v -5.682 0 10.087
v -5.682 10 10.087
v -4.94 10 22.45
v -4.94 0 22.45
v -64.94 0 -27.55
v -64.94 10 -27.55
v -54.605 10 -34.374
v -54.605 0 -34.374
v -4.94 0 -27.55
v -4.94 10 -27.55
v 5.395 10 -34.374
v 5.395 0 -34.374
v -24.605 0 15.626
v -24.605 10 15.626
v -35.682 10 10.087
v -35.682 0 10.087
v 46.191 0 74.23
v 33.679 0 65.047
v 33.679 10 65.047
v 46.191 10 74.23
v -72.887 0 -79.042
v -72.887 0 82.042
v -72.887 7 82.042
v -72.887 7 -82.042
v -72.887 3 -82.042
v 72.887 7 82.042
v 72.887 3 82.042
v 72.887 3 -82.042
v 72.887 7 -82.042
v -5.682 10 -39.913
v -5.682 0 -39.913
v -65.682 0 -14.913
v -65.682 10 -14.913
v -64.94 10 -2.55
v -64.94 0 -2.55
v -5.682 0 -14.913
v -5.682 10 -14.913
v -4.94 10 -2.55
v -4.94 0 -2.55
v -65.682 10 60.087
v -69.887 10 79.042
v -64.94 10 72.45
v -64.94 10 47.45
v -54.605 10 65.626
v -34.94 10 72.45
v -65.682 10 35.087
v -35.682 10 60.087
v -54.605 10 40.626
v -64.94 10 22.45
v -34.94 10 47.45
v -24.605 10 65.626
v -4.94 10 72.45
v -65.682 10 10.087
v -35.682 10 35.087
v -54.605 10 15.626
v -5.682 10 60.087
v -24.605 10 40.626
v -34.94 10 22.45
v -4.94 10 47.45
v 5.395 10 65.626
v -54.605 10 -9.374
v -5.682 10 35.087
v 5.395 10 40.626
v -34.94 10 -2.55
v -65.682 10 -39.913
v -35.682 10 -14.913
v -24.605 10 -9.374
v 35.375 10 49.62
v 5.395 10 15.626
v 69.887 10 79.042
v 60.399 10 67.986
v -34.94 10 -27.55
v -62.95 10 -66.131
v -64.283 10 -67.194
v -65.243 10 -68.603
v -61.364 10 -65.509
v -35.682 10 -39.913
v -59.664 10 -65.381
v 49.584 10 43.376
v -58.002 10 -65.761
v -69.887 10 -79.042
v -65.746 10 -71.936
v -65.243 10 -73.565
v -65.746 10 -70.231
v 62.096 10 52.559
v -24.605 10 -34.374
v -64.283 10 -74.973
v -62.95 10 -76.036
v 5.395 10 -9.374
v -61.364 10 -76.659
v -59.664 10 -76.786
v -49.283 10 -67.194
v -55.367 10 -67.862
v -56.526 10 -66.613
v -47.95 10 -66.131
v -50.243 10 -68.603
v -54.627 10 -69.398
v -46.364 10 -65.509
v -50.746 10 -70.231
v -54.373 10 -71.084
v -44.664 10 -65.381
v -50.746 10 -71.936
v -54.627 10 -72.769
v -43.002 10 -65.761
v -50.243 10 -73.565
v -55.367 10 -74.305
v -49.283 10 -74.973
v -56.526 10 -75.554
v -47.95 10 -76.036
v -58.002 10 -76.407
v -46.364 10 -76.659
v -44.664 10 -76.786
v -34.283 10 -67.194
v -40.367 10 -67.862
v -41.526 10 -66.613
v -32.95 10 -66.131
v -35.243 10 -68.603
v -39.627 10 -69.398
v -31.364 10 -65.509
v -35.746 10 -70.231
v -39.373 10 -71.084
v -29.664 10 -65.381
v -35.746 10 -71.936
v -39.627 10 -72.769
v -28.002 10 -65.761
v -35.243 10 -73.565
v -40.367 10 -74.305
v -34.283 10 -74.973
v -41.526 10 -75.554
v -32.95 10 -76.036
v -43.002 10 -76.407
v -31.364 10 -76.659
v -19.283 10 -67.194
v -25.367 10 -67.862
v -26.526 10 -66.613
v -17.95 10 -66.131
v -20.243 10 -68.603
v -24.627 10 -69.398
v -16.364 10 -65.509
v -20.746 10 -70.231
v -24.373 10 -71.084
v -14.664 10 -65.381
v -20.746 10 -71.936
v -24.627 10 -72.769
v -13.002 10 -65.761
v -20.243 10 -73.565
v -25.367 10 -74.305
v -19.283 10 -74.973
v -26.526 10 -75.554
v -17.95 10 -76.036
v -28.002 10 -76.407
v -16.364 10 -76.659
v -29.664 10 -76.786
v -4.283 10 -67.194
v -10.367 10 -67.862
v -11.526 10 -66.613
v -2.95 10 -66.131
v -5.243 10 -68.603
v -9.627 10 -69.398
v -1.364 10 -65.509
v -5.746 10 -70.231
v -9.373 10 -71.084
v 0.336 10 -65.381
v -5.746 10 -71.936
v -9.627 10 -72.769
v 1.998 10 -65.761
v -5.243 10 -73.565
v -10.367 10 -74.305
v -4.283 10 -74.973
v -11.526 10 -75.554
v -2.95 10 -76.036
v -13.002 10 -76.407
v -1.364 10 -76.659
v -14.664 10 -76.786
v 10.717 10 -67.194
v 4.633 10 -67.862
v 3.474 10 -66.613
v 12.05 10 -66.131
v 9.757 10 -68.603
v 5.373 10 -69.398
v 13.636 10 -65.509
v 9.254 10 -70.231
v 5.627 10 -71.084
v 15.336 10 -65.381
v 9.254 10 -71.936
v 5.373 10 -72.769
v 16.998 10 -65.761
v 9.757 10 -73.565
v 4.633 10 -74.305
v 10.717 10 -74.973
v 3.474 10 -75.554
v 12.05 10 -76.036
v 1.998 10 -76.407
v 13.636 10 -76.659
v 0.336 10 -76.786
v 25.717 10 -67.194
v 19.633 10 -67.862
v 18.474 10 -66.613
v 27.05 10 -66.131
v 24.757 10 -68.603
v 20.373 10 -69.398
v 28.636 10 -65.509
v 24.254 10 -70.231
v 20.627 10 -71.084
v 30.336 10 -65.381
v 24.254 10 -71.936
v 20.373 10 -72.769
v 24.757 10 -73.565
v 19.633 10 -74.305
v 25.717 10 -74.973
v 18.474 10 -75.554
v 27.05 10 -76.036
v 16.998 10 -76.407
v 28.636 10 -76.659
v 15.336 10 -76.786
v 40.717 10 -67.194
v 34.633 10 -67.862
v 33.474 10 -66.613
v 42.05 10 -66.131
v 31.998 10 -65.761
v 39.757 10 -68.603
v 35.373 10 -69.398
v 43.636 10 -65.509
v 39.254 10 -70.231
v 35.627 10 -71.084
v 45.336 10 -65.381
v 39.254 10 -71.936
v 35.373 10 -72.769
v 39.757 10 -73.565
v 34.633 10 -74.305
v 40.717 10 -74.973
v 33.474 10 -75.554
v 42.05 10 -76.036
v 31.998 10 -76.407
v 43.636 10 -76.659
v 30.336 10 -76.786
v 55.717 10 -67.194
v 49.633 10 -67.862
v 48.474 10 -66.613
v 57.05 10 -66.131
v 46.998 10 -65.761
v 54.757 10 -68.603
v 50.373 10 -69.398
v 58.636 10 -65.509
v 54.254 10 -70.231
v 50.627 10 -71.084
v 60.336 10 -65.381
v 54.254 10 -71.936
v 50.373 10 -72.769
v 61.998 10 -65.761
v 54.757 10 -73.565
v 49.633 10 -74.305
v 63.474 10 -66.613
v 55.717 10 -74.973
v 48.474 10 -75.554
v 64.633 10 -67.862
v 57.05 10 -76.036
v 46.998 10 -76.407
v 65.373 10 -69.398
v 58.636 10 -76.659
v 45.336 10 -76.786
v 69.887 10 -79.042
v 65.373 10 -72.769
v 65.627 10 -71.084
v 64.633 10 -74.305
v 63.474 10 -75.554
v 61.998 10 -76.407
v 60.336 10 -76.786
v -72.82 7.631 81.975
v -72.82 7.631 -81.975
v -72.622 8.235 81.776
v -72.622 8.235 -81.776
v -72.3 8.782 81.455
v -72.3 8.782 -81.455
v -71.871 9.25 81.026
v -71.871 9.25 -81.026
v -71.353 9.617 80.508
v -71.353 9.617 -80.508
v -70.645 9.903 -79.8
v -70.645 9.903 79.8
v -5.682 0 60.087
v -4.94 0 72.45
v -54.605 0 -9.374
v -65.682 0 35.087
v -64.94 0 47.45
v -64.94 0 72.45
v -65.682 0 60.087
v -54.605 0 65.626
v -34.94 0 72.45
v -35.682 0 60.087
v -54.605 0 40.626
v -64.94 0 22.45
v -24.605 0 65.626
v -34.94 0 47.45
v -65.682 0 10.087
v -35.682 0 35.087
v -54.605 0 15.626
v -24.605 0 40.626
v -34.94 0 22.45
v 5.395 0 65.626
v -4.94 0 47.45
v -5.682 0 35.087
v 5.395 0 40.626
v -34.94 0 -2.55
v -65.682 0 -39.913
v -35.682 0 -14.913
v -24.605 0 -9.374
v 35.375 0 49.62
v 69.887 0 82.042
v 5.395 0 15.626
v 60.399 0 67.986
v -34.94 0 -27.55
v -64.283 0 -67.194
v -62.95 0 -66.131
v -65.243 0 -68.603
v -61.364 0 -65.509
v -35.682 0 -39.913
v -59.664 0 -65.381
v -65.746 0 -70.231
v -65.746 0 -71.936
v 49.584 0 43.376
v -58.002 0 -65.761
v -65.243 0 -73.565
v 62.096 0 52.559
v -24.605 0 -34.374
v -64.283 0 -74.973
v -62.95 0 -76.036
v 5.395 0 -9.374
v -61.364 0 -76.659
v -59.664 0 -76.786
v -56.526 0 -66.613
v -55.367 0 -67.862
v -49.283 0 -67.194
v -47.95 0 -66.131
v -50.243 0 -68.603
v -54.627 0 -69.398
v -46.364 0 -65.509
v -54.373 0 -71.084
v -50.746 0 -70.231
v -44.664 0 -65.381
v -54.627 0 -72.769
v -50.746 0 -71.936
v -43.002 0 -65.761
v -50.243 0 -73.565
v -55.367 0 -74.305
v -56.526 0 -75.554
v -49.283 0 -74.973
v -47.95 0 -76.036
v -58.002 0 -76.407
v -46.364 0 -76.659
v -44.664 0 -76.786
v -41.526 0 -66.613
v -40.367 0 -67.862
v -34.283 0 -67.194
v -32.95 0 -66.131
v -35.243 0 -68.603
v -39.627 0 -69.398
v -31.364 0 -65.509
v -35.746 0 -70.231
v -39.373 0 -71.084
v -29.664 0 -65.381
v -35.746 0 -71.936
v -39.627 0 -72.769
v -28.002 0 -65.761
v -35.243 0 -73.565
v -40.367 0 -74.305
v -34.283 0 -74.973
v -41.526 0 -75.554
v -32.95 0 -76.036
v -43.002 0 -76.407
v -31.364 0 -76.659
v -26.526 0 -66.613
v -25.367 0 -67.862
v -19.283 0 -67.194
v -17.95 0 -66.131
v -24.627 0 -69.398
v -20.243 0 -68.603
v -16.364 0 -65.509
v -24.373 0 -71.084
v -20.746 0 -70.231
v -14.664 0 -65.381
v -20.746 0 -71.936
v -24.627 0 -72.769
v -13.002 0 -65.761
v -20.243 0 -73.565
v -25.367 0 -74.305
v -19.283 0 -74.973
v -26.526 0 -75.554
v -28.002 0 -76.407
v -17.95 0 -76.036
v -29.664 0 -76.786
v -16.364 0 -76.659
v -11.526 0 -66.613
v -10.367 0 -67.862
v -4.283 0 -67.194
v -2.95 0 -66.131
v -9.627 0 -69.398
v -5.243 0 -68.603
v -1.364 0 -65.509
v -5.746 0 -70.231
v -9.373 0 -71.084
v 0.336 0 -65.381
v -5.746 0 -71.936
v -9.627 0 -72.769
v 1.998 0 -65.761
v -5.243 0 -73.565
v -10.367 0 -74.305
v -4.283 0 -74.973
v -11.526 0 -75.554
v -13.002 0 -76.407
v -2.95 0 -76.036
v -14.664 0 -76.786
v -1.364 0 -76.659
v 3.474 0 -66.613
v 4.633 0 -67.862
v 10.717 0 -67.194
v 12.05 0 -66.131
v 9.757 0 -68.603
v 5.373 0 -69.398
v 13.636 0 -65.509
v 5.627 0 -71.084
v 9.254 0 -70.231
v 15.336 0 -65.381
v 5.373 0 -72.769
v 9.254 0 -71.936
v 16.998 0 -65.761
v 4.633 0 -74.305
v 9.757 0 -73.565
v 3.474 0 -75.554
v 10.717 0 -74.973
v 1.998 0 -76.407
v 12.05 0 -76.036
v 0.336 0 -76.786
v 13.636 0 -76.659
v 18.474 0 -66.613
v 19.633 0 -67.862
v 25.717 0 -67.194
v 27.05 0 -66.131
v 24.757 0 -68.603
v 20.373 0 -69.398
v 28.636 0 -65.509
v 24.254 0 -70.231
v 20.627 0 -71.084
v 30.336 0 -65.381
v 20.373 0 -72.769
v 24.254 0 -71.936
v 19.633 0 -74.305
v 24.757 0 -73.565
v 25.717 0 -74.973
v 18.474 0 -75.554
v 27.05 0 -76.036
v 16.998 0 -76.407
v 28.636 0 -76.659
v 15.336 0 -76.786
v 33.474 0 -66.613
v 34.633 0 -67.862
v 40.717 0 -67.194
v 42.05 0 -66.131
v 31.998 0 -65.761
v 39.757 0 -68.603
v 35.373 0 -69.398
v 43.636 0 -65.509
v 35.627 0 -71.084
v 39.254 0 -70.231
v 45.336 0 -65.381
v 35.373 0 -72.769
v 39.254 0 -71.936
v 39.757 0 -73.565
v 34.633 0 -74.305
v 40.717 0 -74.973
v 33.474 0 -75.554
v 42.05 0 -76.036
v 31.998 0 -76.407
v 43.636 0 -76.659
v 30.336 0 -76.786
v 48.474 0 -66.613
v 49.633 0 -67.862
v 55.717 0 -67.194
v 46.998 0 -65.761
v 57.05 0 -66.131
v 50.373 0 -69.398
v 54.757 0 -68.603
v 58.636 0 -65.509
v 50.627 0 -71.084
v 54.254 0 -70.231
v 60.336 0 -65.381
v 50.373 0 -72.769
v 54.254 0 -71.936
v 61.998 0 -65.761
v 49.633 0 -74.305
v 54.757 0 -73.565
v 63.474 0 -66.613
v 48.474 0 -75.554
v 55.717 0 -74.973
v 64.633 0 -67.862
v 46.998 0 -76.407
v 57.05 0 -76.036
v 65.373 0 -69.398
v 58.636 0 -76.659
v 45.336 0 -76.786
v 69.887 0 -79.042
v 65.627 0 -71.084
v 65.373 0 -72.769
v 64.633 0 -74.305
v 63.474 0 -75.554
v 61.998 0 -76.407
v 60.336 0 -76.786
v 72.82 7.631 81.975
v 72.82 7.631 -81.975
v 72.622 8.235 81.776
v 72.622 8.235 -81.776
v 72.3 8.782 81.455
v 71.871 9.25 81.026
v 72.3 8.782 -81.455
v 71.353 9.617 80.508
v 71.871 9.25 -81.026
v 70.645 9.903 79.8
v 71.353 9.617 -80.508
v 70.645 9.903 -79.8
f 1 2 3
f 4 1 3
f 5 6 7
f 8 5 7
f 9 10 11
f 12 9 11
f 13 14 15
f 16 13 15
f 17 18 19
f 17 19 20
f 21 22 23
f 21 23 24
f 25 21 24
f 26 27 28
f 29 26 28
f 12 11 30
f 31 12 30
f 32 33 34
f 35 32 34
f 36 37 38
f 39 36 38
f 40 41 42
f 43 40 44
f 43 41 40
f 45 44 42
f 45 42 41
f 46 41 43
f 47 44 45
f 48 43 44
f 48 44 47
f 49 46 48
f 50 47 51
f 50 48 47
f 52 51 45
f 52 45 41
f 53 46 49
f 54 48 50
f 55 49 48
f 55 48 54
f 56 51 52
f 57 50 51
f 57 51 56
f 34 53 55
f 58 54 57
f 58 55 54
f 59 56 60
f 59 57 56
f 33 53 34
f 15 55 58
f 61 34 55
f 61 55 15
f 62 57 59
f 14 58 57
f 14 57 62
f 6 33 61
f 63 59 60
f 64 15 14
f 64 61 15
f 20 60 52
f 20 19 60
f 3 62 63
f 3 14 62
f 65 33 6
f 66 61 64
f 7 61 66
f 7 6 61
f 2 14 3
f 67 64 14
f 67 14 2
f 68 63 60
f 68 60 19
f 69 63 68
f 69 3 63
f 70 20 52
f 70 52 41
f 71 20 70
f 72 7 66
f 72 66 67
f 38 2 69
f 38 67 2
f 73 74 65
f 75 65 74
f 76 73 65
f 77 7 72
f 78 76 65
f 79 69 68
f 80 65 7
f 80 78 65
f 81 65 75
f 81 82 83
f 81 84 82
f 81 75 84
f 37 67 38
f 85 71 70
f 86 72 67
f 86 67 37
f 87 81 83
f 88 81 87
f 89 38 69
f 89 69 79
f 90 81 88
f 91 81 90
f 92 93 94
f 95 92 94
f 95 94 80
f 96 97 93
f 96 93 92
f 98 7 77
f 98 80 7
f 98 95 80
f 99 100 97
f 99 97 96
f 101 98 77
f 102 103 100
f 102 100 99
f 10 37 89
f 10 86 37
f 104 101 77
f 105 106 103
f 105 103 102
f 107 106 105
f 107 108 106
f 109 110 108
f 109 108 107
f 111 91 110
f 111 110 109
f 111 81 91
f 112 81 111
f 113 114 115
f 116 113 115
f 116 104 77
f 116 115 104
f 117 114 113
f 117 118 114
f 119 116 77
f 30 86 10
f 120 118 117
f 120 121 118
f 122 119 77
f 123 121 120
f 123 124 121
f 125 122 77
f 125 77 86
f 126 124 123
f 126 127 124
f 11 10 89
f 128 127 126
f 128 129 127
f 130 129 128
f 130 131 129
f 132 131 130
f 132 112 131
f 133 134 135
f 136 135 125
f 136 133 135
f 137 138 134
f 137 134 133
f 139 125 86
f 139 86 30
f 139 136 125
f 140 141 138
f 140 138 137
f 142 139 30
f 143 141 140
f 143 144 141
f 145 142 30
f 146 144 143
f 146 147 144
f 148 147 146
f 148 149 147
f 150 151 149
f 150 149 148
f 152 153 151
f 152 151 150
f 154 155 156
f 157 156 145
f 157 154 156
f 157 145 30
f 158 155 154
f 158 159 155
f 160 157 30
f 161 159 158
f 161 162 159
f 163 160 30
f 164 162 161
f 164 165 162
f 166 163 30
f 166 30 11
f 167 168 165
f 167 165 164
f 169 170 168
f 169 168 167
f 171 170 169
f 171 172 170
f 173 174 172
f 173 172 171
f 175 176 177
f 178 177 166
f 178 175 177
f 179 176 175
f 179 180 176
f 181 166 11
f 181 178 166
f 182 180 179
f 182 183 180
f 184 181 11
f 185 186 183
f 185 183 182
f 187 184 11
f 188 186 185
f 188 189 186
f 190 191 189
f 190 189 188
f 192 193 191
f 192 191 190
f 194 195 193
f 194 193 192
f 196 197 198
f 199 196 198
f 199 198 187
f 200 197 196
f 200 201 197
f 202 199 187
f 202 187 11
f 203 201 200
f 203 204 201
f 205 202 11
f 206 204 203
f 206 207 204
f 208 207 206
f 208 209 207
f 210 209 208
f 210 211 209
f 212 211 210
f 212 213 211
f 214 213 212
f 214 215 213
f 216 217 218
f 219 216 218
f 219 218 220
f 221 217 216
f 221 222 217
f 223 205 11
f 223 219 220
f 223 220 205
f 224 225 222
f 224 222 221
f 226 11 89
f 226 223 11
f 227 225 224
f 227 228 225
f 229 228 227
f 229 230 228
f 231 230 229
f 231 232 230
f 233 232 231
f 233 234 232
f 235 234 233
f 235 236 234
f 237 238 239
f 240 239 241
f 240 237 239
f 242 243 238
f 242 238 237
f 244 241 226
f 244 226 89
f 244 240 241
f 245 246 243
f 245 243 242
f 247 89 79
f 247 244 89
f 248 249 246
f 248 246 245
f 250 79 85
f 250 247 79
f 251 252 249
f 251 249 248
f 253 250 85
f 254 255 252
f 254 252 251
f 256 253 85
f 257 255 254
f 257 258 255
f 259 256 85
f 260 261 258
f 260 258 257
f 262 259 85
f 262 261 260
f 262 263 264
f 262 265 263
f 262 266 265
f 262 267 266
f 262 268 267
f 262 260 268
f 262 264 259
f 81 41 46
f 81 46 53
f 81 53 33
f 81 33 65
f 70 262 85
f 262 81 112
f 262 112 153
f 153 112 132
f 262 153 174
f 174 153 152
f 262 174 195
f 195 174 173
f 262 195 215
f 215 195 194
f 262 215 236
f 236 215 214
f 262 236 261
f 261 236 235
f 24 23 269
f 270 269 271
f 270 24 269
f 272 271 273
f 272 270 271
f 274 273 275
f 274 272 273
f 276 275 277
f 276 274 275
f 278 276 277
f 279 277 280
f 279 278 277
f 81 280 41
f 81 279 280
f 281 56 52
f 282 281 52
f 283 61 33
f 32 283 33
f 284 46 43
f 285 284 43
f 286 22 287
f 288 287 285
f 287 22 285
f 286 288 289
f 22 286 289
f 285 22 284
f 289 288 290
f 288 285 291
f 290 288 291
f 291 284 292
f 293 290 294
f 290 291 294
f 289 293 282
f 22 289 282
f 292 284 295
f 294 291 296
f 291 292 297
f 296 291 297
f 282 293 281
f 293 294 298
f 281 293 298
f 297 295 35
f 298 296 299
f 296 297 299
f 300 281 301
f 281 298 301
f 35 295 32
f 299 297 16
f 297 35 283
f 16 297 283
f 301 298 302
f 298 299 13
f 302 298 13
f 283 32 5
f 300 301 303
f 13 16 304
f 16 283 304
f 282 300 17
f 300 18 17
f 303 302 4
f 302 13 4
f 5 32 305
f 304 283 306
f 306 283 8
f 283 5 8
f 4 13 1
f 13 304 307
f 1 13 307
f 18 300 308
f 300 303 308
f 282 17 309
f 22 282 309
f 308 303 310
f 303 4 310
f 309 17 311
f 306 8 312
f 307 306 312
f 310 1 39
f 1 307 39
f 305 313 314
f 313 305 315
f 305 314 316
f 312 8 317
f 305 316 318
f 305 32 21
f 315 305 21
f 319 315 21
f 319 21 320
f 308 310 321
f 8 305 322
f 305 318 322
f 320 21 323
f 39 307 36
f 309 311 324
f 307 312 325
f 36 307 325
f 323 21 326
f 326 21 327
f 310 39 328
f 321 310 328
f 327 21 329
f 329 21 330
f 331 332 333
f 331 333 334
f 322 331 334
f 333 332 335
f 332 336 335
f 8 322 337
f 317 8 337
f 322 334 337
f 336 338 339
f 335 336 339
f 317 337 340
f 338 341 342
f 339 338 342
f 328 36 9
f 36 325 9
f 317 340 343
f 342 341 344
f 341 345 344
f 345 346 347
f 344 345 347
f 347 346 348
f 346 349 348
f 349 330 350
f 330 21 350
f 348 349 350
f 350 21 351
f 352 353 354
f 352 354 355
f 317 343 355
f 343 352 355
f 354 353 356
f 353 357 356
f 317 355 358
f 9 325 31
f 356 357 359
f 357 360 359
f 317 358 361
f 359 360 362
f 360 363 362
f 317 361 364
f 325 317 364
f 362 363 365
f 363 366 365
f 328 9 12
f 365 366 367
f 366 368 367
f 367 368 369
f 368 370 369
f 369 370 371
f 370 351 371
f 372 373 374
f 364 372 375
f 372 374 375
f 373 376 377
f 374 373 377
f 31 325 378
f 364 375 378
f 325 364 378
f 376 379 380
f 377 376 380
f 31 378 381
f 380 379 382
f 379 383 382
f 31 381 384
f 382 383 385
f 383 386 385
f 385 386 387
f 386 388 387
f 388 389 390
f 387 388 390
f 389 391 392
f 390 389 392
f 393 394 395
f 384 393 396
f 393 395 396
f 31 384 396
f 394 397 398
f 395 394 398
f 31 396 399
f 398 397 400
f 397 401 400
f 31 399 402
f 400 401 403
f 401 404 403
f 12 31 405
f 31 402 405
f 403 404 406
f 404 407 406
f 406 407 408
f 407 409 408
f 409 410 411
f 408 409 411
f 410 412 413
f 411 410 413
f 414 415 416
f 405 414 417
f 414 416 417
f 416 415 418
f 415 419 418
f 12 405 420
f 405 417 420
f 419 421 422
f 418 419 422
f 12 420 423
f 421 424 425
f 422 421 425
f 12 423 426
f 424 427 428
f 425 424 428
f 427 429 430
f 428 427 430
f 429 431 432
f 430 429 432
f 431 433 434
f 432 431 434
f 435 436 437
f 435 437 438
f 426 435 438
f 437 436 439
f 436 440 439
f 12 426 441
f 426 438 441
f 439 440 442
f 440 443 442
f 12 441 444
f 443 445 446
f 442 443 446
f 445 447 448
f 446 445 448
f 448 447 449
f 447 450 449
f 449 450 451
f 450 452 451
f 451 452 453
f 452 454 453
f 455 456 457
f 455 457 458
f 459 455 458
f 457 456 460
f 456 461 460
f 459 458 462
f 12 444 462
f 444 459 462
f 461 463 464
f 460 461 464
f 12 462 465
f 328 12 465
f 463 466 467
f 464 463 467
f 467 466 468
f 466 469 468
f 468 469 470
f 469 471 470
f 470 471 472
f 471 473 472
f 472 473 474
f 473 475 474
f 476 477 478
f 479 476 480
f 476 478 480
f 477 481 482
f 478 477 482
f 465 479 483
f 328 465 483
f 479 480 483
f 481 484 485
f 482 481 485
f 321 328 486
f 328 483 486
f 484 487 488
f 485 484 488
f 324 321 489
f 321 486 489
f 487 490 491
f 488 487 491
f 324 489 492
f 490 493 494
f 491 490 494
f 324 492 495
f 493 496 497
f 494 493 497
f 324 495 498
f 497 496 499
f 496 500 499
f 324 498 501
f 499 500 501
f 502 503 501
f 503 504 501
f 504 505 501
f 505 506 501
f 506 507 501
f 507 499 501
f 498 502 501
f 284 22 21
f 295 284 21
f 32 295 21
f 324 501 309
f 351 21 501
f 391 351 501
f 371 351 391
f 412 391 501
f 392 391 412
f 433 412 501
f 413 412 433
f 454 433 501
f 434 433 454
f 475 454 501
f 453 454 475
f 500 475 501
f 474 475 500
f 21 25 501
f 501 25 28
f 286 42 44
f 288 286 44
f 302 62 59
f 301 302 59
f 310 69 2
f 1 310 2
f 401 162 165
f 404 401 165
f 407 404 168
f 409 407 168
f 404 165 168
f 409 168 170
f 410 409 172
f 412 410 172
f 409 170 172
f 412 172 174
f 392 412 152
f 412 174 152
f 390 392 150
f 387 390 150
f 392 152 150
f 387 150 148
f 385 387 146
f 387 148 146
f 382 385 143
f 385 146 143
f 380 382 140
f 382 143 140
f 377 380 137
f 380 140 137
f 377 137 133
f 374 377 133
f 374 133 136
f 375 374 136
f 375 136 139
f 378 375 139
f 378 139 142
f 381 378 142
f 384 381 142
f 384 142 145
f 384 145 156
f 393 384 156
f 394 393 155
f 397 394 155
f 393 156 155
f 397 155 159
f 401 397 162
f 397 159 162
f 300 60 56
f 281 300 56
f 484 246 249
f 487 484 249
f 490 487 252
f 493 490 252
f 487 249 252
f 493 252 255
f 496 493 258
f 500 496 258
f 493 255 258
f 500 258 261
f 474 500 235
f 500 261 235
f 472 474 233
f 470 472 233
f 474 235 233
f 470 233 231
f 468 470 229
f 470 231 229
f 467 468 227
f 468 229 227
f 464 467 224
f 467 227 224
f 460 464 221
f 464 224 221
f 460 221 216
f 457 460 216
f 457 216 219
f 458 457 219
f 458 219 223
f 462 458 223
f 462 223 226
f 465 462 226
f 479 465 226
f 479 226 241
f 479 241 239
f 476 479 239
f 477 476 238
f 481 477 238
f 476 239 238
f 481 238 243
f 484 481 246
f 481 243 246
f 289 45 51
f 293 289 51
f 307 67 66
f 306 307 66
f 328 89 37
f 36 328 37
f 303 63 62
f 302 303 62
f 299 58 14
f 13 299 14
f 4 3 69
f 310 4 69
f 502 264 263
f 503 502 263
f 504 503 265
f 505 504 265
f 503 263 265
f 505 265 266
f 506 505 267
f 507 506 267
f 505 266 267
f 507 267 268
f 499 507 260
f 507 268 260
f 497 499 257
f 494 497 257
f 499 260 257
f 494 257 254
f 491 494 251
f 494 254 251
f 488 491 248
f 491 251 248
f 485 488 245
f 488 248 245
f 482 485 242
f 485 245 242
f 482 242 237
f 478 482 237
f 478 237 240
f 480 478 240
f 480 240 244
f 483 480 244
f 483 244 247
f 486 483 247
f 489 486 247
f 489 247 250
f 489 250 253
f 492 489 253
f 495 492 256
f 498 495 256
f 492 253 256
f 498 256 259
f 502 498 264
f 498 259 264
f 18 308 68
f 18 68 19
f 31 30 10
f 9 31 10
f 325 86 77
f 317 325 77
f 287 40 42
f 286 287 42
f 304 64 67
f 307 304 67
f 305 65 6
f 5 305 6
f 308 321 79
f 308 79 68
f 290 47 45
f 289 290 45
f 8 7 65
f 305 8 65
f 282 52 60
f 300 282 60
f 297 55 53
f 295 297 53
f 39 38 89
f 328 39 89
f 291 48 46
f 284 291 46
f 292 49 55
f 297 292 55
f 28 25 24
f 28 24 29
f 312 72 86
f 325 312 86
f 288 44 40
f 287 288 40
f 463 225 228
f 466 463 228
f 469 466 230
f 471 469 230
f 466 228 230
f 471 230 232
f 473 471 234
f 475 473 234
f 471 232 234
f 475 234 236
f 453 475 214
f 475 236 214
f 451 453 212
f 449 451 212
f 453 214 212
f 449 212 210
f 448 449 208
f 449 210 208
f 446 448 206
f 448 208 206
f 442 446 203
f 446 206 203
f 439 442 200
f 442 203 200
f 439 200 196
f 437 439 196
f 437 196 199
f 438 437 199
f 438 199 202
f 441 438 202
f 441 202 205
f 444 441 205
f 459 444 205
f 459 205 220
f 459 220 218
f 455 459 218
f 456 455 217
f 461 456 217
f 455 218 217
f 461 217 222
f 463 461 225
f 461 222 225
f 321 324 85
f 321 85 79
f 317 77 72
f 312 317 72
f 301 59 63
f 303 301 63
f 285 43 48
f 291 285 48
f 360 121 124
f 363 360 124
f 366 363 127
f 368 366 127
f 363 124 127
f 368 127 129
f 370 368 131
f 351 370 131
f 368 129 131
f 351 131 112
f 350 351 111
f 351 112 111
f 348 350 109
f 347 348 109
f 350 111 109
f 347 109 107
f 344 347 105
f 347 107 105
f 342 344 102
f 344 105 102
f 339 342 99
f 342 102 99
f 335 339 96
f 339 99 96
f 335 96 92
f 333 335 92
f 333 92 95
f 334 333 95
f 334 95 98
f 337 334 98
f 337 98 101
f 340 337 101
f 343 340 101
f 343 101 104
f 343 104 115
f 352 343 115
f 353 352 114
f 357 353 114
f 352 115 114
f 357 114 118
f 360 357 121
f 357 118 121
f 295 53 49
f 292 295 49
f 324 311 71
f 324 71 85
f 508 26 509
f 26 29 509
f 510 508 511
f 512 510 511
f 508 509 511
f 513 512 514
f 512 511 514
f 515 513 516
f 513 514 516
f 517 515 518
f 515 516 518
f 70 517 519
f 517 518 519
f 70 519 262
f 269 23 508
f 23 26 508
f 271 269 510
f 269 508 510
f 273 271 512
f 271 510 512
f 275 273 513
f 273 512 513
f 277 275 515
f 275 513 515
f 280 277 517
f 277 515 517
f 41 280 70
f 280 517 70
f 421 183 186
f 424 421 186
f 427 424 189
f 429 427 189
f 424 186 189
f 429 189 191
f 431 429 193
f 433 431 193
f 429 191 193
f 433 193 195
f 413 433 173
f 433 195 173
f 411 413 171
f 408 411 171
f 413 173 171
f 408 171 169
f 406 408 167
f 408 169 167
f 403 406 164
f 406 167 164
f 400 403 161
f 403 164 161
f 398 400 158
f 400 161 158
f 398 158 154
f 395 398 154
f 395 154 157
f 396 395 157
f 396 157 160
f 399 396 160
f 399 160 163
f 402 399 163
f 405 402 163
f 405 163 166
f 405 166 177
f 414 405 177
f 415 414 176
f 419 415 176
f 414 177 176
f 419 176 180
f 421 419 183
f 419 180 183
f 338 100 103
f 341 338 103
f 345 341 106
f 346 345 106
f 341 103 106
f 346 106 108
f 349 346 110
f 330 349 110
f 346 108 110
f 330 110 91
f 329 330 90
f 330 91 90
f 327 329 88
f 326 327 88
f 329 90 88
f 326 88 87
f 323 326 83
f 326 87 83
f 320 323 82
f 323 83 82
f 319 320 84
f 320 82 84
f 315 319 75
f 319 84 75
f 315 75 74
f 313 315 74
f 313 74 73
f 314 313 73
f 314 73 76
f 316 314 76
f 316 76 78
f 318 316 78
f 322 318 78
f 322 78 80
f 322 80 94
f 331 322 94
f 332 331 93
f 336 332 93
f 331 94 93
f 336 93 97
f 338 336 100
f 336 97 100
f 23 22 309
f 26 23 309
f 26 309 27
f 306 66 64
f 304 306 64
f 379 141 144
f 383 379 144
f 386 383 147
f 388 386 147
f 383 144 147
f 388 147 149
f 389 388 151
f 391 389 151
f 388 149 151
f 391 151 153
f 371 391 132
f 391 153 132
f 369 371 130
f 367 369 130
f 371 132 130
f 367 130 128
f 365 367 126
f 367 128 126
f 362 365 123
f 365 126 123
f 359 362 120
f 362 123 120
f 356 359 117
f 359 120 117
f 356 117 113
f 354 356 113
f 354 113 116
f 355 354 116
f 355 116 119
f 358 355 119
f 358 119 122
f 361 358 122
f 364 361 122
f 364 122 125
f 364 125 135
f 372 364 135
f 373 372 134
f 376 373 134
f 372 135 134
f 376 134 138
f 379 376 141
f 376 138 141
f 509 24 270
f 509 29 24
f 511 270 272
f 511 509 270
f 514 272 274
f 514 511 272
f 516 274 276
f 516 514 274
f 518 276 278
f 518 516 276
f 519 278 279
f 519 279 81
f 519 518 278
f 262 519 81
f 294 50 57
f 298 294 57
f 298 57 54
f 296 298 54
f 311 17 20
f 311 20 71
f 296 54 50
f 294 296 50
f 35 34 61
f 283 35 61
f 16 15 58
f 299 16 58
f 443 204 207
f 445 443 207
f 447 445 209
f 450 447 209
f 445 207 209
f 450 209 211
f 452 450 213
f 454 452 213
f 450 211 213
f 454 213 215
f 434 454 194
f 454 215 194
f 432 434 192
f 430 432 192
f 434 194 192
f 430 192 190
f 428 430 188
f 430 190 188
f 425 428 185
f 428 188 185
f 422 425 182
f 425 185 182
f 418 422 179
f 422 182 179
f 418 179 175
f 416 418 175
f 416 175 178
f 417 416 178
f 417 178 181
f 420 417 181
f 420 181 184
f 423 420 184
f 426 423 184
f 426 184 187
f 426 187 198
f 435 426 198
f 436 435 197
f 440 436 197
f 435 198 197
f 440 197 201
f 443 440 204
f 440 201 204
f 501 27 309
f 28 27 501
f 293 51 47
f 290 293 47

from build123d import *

# Parameters (mm, degrees)
SKETCH1_W            = 145.774647888
SKETCH1_H            = 164.084507042
BOSS_EXTRUDE1_DEPTH  = 10
FILLET1_R            = 3
SKETCH2_R            = 5.718299624
CUT_EXTRUDE1_DEPTH   = 10
LPATTERN1_COUNT      = 9
LPATTERN1_PITCH      = 15
CUT_EXTRUDE2_DEPTH   = 10
LPATTERN2_COUNT      = 5
LPATTERN2_PITCH      = 25
LPATTERN2_COUNT_DIR2 = 3
LPATTERN2_PITCH_DIR2 = 30
CHAMFER1_SIZE        = 3


with BuildPart() as part:
    # Sketch1 → Boss-Extrude1 (new body)
    with BuildSketch(Plane(origin=(0, 0, 0), x_dir=(1, 0, 0), z_dir=(0, 1, 0))):
        Rectangle(SKETCH1_W, SKETCH1_H)
        Polygon((60.399278767, -67.985661607), (62.095878149, -52.558568526), (49.583923326, -43.375723821), (35.375369121, -49.619972196), (33.678769738, -65.047065276), (46.190724561, -74.229909982), align=None, mode=Mode.SUBTRACT)
    extrude(amount=BOSS_EXTRUDE1_DEPTH)

    # Fillet1
    fillet1_edges = [part.edges().sort_by_distance(p)[0] for p in [
        (-72.887323944, 10, 0),
        (0, 10, 82.042253521),
        (72.887323944, 10, 0),
        (0, 10, -82.042253521),
    ]]
    fillet(fillet1_edges, radius=FILLET1_R)

    # Sketch2 → Cut-Extrude1 (cut)
    with BuildSketch(Plane(origin=(0, 10, 0), x_dir=(1, 0, 0), z_dir=(0, 1, 0))):
        with Locations((-60.091318796, 71.08363321)):
            Circle(SKETCH2_R)
    cut_extrude1 = extrude(amount=-CUT_EXTRUDE1_DEPTH, mode=Mode.SUBTRACT)

    # LPattern1: Cut-Extrude1 ×9
    with Locations(*[(i * LPATTERN1_PITCH, 0, 0) for i in range(1, LPATTERN1_COUNT)]):
        add(cut_extrude1, mode=Mode.SUBTRACT)

    # Sketch3 → Cut-Extrude2 (cut)
    with BuildSketch(Plane(origin=(0, 10, 0), x_dir=(1, 0, 0), z_dir=(0, 1, 0))):
        Polygon((-64.940245829, 27.550407321), (-54.604744837, 34.374463584), (-65.682301413, 39.913241872), align=None)
    cut_extrude2 = extrude(amount=-CUT_EXTRUDE2_DEPTH, mode=Mode.SUBTRACT)

    # LPattern2: Cut-Extrude2 5 × 3
    with Locations(*[(j * LPATTERN2_PITCH_DIR2, 0, i * LPATTERN2_PITCH) for i in range(LPATTERN2_COUNT) for j in range(LPATTERN2_COUNT_DIR2) if (i, j) != (0, 0)]):
        add(cut_extrude2, mode=Mode.SUBTRACT)

    # Chamfer1
    chamfer1_edges = [part.edges().sort_by_distance(p)[0] for p in [
        (0, 0, -82.042253521),
        (72.887323944, 0, 0),
    ]]
    chamfer(chamfer1_edges, length=CHAMFER1_SIZE)


solid = part.part
